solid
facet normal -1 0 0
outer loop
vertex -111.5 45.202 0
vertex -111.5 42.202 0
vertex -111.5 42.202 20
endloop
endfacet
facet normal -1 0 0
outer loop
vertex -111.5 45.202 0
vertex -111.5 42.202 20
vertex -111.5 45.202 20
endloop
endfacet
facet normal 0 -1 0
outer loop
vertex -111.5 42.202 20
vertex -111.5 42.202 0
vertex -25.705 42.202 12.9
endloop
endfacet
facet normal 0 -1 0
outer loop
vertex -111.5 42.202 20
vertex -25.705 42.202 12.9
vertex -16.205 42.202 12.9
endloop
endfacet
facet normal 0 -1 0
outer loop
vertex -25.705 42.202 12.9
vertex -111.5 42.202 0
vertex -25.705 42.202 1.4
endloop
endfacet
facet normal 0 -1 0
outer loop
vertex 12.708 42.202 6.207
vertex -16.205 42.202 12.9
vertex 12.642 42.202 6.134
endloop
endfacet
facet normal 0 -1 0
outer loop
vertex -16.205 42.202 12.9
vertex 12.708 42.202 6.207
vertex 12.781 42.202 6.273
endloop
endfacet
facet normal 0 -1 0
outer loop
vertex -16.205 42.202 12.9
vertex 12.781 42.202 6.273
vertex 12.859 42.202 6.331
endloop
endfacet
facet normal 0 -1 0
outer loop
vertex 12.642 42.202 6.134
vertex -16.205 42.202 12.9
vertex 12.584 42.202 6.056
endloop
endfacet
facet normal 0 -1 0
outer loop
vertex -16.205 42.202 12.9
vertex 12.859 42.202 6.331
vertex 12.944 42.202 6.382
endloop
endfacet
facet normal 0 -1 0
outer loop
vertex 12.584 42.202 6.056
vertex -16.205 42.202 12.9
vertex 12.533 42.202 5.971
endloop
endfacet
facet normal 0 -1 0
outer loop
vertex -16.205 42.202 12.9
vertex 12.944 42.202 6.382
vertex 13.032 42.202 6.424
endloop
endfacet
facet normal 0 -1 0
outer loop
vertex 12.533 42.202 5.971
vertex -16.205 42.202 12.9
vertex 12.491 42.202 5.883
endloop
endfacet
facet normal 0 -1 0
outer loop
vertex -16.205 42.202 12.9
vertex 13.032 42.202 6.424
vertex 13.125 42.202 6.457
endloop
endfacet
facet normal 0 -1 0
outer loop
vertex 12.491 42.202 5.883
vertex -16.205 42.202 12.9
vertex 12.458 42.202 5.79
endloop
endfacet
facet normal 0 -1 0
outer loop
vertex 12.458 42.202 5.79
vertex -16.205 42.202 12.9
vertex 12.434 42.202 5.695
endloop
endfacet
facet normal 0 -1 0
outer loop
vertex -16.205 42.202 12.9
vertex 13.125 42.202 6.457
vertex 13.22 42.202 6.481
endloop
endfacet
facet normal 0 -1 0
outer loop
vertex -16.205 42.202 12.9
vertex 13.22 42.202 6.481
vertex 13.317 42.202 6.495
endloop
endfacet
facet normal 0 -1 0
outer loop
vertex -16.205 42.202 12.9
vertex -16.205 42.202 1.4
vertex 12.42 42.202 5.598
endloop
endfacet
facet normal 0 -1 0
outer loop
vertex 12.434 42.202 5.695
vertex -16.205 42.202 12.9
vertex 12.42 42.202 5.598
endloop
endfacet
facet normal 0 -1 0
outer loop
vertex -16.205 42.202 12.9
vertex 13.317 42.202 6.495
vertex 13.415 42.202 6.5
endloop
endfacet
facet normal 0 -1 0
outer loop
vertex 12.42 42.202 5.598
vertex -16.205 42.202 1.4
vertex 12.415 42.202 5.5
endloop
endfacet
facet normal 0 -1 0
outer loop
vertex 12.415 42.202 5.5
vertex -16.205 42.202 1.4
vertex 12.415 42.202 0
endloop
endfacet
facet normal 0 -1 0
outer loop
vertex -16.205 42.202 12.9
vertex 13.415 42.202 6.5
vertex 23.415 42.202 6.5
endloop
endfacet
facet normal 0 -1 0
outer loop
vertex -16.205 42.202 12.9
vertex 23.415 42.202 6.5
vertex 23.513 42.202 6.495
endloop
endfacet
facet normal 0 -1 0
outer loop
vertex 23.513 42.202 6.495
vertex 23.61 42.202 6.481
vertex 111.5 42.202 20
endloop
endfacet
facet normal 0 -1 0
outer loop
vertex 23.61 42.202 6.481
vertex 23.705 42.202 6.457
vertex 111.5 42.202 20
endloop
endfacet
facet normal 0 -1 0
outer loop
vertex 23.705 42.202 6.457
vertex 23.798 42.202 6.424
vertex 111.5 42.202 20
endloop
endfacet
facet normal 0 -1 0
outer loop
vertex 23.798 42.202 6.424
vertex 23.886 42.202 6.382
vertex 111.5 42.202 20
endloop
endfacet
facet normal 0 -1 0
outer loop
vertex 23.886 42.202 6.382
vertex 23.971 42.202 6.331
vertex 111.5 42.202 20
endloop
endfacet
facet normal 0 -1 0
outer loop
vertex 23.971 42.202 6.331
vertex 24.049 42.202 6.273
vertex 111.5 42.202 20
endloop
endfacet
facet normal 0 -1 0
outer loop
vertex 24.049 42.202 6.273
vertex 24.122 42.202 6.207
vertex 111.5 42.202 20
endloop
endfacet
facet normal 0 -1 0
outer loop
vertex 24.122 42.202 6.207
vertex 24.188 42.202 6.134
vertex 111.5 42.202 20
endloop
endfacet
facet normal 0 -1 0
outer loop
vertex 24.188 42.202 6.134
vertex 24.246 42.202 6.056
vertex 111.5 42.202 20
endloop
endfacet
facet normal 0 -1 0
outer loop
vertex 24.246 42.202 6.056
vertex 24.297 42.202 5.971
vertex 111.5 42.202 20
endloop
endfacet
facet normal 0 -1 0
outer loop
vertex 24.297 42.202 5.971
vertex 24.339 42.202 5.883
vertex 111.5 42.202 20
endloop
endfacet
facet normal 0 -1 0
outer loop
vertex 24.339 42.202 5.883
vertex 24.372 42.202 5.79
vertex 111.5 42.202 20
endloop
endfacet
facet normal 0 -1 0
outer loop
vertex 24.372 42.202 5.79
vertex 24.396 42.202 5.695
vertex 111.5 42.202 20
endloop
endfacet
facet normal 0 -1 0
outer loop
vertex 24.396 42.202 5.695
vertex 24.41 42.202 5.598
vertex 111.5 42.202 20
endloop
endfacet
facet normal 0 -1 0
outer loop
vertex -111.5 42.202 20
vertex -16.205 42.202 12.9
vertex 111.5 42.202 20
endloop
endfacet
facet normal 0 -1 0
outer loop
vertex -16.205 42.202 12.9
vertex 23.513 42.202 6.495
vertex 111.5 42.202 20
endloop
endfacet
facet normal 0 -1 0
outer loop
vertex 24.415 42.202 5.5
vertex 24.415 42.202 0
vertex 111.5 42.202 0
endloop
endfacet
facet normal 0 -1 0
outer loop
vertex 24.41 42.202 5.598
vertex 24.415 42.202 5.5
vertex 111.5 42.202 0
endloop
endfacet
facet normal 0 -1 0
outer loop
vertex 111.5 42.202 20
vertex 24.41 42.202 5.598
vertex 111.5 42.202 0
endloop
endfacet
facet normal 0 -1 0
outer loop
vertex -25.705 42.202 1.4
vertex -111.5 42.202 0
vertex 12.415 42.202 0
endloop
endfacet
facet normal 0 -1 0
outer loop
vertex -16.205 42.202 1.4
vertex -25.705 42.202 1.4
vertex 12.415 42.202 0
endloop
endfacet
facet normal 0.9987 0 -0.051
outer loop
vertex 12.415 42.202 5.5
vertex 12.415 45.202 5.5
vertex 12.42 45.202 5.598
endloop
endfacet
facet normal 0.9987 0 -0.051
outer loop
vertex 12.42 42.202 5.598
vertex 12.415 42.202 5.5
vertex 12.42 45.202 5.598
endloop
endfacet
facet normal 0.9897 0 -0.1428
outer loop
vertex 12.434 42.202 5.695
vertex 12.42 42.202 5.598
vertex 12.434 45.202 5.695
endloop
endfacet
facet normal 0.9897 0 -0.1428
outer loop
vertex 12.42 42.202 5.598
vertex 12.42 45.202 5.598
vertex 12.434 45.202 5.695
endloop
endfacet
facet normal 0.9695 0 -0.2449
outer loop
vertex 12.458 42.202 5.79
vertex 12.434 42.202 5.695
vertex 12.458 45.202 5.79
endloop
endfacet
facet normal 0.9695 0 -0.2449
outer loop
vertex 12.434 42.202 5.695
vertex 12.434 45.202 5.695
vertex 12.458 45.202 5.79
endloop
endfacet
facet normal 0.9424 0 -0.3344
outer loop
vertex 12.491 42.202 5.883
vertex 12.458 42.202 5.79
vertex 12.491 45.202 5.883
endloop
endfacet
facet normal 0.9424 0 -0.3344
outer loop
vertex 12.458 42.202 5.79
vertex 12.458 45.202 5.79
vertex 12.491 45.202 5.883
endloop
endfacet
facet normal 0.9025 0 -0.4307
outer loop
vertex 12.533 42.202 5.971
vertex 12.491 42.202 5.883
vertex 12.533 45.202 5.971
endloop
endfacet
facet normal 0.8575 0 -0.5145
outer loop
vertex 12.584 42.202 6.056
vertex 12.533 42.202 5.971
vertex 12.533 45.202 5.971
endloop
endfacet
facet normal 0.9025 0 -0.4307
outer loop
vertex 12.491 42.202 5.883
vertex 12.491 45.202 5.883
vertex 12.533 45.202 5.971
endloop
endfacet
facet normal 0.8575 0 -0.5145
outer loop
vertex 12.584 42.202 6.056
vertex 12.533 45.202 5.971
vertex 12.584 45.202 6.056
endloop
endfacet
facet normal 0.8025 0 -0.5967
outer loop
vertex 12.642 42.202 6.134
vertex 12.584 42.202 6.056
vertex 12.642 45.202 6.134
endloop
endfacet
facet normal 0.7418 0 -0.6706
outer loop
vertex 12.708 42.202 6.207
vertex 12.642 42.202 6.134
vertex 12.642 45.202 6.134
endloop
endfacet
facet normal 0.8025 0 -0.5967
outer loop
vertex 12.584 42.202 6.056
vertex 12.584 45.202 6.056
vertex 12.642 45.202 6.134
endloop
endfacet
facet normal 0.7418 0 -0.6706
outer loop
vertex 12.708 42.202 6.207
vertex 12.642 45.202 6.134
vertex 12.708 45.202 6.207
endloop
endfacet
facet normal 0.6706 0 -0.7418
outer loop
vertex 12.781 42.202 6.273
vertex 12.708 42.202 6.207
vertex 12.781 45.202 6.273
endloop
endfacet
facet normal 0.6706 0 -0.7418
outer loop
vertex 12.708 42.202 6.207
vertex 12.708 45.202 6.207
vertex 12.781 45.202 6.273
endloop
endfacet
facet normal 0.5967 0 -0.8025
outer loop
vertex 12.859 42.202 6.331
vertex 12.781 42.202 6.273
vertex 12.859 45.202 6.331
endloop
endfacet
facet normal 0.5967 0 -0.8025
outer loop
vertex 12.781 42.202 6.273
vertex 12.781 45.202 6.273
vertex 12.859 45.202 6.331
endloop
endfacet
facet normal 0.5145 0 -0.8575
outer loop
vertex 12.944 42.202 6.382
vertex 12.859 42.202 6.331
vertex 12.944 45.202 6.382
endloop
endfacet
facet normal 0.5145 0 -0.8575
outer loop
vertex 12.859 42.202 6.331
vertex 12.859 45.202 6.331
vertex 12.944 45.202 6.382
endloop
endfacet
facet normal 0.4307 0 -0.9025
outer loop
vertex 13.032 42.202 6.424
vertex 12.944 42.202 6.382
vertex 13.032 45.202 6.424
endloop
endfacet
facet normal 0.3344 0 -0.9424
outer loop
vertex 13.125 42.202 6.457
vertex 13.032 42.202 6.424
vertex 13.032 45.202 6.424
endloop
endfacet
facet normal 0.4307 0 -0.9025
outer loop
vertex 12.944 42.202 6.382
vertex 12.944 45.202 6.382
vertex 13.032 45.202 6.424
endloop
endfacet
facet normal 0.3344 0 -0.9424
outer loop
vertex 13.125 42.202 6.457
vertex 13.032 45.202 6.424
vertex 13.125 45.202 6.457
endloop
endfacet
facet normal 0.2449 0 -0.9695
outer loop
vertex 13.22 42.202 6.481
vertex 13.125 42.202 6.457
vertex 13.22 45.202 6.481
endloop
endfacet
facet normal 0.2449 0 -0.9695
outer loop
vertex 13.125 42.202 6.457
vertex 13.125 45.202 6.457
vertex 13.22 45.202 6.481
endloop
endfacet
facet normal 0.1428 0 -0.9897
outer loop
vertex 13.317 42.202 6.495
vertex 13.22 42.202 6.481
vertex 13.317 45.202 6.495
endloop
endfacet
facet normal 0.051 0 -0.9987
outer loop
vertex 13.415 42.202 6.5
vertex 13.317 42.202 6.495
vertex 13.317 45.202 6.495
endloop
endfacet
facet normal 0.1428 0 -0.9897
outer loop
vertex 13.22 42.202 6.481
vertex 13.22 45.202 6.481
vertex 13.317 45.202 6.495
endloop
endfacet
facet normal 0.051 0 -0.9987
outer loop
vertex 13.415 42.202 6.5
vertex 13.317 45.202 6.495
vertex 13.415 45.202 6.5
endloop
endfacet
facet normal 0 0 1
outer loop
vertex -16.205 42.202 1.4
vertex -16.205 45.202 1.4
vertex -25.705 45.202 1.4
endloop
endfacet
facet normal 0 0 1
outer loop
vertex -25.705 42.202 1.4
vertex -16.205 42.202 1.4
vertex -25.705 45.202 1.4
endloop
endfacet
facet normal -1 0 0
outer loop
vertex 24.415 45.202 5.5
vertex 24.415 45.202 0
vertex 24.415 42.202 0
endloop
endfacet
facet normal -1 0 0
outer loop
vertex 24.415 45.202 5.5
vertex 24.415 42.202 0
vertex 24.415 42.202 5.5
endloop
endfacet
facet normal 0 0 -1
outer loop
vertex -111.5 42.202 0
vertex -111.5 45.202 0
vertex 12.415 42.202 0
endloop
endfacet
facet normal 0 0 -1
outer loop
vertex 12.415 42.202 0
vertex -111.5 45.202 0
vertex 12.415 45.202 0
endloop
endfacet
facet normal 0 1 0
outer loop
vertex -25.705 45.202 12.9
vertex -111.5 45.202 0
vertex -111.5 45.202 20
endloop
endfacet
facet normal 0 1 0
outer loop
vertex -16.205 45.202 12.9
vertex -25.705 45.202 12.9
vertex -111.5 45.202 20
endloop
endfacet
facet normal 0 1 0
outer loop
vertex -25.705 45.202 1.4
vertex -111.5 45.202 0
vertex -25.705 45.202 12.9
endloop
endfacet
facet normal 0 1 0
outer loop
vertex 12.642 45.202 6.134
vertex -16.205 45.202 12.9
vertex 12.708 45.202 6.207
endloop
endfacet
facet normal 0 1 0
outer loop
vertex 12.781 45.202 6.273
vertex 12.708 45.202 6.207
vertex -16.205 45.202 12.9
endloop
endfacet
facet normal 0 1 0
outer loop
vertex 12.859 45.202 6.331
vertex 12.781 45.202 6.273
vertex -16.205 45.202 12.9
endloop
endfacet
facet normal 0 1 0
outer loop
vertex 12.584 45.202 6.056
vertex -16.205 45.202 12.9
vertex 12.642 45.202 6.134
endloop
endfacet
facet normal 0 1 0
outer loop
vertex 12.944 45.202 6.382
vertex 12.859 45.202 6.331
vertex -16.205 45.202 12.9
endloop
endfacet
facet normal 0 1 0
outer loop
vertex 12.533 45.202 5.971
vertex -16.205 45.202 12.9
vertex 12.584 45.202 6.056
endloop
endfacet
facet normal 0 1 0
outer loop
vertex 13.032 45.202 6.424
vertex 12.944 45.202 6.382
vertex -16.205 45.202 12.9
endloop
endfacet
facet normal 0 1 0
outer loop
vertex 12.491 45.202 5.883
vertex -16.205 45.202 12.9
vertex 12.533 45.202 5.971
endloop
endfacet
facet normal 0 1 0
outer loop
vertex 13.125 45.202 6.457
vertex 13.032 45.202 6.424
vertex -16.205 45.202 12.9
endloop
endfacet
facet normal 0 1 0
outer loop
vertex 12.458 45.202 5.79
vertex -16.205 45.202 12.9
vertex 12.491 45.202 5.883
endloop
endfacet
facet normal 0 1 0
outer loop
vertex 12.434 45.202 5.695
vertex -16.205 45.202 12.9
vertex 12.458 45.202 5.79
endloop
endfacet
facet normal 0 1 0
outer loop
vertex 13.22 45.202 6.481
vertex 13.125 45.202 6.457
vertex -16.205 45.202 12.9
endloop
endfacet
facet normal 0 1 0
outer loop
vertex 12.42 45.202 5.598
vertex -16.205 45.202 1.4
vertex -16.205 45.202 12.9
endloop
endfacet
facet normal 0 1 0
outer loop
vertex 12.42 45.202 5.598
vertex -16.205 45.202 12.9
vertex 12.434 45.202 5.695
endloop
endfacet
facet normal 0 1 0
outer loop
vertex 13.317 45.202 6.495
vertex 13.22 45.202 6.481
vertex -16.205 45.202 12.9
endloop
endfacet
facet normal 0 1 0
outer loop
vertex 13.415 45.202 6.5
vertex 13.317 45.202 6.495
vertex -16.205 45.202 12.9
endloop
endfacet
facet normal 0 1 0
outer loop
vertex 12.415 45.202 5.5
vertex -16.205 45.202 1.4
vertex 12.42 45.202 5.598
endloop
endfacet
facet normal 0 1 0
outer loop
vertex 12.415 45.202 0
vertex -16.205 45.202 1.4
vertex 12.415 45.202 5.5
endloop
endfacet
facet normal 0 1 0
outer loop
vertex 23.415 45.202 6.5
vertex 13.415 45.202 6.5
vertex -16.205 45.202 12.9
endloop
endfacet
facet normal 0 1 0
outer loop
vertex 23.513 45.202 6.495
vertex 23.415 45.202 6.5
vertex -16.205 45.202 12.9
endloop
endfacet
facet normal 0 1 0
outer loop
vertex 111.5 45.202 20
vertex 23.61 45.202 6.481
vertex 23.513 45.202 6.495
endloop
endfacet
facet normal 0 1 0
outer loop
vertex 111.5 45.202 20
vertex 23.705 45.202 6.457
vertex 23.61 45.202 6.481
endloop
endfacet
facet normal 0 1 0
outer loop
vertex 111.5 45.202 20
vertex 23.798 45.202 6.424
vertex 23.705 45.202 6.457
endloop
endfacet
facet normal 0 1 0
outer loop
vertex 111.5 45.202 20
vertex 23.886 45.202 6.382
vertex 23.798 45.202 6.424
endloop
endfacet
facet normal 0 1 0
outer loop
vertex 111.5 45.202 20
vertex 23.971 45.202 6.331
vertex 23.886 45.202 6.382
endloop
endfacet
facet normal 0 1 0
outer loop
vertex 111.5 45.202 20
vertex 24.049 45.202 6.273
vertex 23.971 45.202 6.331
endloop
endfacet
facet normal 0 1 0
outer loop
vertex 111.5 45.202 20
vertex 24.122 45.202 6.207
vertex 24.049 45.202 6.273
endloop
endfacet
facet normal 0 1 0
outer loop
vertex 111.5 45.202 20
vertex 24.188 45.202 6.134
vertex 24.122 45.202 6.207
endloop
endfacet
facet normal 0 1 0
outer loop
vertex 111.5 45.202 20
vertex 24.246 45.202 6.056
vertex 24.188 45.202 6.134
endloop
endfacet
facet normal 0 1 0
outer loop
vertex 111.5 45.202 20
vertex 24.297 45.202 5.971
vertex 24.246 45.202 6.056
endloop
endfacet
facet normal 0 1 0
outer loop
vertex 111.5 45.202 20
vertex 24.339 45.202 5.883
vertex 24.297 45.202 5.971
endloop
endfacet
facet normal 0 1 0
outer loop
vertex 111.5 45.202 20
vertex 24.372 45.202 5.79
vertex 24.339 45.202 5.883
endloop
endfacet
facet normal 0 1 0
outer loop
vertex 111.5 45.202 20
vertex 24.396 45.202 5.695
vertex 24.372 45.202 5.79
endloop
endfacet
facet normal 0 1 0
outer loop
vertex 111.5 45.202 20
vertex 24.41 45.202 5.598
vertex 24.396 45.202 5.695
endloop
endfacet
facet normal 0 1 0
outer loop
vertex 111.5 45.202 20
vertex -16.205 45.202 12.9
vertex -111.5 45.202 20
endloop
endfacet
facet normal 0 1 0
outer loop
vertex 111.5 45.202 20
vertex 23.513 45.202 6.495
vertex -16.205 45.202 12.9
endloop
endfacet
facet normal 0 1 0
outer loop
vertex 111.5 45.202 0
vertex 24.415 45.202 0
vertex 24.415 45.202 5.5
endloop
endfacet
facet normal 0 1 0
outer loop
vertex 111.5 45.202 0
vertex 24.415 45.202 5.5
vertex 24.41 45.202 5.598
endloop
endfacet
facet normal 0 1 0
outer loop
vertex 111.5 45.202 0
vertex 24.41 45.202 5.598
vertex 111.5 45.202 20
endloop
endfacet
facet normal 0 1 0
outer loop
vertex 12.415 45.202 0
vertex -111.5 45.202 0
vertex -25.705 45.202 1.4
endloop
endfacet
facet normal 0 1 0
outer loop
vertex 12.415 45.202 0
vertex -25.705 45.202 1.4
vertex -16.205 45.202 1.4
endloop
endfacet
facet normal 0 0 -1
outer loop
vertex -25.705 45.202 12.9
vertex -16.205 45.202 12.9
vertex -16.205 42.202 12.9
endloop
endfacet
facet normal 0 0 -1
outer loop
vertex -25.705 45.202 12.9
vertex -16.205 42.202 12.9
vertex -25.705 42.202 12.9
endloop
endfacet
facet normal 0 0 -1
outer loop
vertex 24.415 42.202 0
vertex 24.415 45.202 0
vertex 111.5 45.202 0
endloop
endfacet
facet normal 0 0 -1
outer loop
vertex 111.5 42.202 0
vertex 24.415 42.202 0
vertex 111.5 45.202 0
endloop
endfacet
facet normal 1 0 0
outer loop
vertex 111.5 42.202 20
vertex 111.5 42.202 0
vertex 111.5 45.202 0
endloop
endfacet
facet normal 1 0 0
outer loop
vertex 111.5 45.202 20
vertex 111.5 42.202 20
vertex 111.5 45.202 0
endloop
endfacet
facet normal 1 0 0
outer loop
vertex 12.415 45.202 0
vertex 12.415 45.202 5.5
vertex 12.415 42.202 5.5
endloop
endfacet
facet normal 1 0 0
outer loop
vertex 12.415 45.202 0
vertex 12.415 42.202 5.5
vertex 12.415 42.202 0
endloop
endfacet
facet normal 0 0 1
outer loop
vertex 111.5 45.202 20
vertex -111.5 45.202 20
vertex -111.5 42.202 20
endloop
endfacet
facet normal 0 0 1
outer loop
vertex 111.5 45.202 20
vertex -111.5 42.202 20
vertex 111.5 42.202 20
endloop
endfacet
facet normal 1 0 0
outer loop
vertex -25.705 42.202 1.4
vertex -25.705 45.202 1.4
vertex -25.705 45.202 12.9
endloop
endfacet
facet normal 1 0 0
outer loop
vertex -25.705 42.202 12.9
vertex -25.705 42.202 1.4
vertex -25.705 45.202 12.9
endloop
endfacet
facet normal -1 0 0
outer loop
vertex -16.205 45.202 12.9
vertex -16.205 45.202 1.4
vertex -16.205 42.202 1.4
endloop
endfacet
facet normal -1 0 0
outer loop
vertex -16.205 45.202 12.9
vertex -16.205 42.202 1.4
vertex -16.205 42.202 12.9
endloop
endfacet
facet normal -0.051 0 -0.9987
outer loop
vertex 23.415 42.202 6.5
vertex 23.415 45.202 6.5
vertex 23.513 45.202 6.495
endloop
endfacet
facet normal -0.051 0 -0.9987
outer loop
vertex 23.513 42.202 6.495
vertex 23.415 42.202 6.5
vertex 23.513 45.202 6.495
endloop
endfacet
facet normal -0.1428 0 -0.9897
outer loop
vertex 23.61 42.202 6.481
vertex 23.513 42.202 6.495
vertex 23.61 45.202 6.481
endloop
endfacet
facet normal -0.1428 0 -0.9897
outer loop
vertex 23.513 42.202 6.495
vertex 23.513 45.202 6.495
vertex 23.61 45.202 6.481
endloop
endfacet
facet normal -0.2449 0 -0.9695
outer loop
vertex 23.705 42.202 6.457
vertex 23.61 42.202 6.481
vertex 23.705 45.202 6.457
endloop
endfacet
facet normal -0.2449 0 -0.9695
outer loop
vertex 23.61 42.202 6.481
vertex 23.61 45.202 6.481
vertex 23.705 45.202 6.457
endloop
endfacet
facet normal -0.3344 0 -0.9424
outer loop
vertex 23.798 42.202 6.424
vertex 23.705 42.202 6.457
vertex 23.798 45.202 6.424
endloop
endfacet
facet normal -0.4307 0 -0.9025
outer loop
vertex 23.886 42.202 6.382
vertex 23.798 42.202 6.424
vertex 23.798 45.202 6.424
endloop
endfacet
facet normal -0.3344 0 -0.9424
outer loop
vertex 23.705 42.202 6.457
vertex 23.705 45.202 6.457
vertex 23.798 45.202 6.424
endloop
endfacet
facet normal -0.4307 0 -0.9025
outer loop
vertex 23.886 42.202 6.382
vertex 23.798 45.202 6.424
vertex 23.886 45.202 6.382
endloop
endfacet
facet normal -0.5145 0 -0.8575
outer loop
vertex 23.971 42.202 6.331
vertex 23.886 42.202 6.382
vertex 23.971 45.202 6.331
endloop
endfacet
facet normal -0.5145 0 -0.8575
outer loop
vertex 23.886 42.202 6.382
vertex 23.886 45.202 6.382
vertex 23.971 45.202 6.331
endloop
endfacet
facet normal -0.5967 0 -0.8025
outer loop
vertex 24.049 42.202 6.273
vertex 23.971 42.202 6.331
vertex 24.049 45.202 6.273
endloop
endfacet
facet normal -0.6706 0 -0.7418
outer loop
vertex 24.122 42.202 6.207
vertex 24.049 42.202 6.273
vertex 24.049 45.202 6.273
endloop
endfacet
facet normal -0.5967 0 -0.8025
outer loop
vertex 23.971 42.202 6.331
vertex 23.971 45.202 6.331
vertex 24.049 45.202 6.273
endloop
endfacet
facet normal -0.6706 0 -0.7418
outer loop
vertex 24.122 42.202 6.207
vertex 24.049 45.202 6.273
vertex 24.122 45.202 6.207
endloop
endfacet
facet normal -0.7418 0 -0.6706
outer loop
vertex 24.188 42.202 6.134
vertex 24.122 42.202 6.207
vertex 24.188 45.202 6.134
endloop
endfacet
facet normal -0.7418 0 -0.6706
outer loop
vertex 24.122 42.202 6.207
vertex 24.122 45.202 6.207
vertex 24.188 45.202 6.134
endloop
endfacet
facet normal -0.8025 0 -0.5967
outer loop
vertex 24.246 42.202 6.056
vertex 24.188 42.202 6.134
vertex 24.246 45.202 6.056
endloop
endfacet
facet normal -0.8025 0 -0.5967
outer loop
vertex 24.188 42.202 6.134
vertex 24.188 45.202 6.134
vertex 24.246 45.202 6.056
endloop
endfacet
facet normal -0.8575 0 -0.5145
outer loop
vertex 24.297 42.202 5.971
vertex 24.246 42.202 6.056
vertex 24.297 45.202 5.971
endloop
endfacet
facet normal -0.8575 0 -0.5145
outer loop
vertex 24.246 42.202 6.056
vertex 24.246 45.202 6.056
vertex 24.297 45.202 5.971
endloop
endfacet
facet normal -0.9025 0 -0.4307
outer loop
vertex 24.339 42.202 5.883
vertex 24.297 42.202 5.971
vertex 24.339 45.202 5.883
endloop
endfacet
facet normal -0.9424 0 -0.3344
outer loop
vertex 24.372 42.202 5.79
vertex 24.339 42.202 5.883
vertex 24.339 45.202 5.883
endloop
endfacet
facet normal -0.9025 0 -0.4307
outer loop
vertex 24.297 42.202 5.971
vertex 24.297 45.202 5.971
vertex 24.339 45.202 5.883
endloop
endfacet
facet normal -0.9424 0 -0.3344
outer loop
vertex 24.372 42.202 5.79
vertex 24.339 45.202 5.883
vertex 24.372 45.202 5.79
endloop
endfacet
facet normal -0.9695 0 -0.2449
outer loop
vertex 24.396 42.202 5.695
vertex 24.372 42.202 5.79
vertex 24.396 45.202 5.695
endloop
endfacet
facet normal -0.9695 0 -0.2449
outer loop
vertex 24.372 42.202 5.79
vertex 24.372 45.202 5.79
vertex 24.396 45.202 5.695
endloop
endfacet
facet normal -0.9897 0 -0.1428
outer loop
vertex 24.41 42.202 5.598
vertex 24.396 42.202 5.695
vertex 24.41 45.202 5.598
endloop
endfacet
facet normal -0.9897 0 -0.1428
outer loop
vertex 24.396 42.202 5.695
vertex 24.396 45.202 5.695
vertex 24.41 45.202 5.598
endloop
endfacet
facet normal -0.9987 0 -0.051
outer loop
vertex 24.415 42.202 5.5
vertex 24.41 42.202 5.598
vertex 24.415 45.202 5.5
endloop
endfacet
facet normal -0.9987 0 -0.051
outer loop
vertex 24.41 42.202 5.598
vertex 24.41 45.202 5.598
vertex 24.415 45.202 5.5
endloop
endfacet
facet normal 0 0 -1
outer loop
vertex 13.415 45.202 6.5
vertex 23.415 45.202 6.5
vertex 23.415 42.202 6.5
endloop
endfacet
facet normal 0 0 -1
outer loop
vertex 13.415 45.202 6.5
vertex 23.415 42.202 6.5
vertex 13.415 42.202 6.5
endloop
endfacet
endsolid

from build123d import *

# Parameters (mm, degrees)
SKETCH021_W     = 223
SKETCH021_H     = 3
PAD022_DEPTH    = 20
SKETCH022_W     = 9.5
SKETCH022_H     = 11.5
POCKET_DEPTH    = 3.001
POCKET001_DEPTH = 3.001


with BuildPart() as part:
    # Sketch021 → Pad022 (new body)
    with BuildSketch(Plane.XY):
        with Locations((0, -44.689828)):
            Rectangle(SKETCH021_W, SKETCH021_H)
    extrude(amount=PAD022_DEPTH)

    # Sketch022 (on Face3 of Pad022) → Pocket (cut, through all)
    with BuildSketch(Plane(origin=(0, -43.189828, 0), x_dir=(-1, 0, 0), z_dir=(0, 1, 0))):
        with Locations((20.955, 7.15)):
            Rectangle(SKETCH022_W, SKETCH022_H)
    extrude(amount=-POCKET_DEPTH, mode=Mode.SUBTRACT)

    # Sketch023 (on Face10 of Pocket) → Pocket001 (cut, through all)
    with BuildSketch(Plane(origin=(0, -43.189828, 0), x_dir=(-1, 0, 0), z_dir=(0, 1, 0))):
        with BuildLine():
            Line((-23.415, 6.5), (-13.415, 6.5))
            ThreePointArc((-12.415, 5.5), (-12.707893, 6.207107), (-13.415, 6.5))
            Line((-12.415, 5.5), (-12.415, -0.5))
            ThreePointArc((-13.415, -1.5), (-12.707893, -1.207107), (-12.415, -0.5))
            Line((-13.415, -1.5), (-23.415, -1.5))
            ThreePointArc((-24.415, -0.5), (-24.122107, -1.207107), (-23.415, -1.5))
            Line((-24.415, -0.5), (-24.415, 5.5))
            ThreePointArc((-23.415, 6.5), (-24.122107, 6.207107), (-24.415, 5.5))
        make_face()
    extrude(amount=-POCKET001_DEPTH, mode=Mode.SUBTRACT)


with BuildPart() as part_1:
    # Body013 placement: moved
    add(part.part.moved(Location((0, 88.392, 0))))


solid = part_1.part
